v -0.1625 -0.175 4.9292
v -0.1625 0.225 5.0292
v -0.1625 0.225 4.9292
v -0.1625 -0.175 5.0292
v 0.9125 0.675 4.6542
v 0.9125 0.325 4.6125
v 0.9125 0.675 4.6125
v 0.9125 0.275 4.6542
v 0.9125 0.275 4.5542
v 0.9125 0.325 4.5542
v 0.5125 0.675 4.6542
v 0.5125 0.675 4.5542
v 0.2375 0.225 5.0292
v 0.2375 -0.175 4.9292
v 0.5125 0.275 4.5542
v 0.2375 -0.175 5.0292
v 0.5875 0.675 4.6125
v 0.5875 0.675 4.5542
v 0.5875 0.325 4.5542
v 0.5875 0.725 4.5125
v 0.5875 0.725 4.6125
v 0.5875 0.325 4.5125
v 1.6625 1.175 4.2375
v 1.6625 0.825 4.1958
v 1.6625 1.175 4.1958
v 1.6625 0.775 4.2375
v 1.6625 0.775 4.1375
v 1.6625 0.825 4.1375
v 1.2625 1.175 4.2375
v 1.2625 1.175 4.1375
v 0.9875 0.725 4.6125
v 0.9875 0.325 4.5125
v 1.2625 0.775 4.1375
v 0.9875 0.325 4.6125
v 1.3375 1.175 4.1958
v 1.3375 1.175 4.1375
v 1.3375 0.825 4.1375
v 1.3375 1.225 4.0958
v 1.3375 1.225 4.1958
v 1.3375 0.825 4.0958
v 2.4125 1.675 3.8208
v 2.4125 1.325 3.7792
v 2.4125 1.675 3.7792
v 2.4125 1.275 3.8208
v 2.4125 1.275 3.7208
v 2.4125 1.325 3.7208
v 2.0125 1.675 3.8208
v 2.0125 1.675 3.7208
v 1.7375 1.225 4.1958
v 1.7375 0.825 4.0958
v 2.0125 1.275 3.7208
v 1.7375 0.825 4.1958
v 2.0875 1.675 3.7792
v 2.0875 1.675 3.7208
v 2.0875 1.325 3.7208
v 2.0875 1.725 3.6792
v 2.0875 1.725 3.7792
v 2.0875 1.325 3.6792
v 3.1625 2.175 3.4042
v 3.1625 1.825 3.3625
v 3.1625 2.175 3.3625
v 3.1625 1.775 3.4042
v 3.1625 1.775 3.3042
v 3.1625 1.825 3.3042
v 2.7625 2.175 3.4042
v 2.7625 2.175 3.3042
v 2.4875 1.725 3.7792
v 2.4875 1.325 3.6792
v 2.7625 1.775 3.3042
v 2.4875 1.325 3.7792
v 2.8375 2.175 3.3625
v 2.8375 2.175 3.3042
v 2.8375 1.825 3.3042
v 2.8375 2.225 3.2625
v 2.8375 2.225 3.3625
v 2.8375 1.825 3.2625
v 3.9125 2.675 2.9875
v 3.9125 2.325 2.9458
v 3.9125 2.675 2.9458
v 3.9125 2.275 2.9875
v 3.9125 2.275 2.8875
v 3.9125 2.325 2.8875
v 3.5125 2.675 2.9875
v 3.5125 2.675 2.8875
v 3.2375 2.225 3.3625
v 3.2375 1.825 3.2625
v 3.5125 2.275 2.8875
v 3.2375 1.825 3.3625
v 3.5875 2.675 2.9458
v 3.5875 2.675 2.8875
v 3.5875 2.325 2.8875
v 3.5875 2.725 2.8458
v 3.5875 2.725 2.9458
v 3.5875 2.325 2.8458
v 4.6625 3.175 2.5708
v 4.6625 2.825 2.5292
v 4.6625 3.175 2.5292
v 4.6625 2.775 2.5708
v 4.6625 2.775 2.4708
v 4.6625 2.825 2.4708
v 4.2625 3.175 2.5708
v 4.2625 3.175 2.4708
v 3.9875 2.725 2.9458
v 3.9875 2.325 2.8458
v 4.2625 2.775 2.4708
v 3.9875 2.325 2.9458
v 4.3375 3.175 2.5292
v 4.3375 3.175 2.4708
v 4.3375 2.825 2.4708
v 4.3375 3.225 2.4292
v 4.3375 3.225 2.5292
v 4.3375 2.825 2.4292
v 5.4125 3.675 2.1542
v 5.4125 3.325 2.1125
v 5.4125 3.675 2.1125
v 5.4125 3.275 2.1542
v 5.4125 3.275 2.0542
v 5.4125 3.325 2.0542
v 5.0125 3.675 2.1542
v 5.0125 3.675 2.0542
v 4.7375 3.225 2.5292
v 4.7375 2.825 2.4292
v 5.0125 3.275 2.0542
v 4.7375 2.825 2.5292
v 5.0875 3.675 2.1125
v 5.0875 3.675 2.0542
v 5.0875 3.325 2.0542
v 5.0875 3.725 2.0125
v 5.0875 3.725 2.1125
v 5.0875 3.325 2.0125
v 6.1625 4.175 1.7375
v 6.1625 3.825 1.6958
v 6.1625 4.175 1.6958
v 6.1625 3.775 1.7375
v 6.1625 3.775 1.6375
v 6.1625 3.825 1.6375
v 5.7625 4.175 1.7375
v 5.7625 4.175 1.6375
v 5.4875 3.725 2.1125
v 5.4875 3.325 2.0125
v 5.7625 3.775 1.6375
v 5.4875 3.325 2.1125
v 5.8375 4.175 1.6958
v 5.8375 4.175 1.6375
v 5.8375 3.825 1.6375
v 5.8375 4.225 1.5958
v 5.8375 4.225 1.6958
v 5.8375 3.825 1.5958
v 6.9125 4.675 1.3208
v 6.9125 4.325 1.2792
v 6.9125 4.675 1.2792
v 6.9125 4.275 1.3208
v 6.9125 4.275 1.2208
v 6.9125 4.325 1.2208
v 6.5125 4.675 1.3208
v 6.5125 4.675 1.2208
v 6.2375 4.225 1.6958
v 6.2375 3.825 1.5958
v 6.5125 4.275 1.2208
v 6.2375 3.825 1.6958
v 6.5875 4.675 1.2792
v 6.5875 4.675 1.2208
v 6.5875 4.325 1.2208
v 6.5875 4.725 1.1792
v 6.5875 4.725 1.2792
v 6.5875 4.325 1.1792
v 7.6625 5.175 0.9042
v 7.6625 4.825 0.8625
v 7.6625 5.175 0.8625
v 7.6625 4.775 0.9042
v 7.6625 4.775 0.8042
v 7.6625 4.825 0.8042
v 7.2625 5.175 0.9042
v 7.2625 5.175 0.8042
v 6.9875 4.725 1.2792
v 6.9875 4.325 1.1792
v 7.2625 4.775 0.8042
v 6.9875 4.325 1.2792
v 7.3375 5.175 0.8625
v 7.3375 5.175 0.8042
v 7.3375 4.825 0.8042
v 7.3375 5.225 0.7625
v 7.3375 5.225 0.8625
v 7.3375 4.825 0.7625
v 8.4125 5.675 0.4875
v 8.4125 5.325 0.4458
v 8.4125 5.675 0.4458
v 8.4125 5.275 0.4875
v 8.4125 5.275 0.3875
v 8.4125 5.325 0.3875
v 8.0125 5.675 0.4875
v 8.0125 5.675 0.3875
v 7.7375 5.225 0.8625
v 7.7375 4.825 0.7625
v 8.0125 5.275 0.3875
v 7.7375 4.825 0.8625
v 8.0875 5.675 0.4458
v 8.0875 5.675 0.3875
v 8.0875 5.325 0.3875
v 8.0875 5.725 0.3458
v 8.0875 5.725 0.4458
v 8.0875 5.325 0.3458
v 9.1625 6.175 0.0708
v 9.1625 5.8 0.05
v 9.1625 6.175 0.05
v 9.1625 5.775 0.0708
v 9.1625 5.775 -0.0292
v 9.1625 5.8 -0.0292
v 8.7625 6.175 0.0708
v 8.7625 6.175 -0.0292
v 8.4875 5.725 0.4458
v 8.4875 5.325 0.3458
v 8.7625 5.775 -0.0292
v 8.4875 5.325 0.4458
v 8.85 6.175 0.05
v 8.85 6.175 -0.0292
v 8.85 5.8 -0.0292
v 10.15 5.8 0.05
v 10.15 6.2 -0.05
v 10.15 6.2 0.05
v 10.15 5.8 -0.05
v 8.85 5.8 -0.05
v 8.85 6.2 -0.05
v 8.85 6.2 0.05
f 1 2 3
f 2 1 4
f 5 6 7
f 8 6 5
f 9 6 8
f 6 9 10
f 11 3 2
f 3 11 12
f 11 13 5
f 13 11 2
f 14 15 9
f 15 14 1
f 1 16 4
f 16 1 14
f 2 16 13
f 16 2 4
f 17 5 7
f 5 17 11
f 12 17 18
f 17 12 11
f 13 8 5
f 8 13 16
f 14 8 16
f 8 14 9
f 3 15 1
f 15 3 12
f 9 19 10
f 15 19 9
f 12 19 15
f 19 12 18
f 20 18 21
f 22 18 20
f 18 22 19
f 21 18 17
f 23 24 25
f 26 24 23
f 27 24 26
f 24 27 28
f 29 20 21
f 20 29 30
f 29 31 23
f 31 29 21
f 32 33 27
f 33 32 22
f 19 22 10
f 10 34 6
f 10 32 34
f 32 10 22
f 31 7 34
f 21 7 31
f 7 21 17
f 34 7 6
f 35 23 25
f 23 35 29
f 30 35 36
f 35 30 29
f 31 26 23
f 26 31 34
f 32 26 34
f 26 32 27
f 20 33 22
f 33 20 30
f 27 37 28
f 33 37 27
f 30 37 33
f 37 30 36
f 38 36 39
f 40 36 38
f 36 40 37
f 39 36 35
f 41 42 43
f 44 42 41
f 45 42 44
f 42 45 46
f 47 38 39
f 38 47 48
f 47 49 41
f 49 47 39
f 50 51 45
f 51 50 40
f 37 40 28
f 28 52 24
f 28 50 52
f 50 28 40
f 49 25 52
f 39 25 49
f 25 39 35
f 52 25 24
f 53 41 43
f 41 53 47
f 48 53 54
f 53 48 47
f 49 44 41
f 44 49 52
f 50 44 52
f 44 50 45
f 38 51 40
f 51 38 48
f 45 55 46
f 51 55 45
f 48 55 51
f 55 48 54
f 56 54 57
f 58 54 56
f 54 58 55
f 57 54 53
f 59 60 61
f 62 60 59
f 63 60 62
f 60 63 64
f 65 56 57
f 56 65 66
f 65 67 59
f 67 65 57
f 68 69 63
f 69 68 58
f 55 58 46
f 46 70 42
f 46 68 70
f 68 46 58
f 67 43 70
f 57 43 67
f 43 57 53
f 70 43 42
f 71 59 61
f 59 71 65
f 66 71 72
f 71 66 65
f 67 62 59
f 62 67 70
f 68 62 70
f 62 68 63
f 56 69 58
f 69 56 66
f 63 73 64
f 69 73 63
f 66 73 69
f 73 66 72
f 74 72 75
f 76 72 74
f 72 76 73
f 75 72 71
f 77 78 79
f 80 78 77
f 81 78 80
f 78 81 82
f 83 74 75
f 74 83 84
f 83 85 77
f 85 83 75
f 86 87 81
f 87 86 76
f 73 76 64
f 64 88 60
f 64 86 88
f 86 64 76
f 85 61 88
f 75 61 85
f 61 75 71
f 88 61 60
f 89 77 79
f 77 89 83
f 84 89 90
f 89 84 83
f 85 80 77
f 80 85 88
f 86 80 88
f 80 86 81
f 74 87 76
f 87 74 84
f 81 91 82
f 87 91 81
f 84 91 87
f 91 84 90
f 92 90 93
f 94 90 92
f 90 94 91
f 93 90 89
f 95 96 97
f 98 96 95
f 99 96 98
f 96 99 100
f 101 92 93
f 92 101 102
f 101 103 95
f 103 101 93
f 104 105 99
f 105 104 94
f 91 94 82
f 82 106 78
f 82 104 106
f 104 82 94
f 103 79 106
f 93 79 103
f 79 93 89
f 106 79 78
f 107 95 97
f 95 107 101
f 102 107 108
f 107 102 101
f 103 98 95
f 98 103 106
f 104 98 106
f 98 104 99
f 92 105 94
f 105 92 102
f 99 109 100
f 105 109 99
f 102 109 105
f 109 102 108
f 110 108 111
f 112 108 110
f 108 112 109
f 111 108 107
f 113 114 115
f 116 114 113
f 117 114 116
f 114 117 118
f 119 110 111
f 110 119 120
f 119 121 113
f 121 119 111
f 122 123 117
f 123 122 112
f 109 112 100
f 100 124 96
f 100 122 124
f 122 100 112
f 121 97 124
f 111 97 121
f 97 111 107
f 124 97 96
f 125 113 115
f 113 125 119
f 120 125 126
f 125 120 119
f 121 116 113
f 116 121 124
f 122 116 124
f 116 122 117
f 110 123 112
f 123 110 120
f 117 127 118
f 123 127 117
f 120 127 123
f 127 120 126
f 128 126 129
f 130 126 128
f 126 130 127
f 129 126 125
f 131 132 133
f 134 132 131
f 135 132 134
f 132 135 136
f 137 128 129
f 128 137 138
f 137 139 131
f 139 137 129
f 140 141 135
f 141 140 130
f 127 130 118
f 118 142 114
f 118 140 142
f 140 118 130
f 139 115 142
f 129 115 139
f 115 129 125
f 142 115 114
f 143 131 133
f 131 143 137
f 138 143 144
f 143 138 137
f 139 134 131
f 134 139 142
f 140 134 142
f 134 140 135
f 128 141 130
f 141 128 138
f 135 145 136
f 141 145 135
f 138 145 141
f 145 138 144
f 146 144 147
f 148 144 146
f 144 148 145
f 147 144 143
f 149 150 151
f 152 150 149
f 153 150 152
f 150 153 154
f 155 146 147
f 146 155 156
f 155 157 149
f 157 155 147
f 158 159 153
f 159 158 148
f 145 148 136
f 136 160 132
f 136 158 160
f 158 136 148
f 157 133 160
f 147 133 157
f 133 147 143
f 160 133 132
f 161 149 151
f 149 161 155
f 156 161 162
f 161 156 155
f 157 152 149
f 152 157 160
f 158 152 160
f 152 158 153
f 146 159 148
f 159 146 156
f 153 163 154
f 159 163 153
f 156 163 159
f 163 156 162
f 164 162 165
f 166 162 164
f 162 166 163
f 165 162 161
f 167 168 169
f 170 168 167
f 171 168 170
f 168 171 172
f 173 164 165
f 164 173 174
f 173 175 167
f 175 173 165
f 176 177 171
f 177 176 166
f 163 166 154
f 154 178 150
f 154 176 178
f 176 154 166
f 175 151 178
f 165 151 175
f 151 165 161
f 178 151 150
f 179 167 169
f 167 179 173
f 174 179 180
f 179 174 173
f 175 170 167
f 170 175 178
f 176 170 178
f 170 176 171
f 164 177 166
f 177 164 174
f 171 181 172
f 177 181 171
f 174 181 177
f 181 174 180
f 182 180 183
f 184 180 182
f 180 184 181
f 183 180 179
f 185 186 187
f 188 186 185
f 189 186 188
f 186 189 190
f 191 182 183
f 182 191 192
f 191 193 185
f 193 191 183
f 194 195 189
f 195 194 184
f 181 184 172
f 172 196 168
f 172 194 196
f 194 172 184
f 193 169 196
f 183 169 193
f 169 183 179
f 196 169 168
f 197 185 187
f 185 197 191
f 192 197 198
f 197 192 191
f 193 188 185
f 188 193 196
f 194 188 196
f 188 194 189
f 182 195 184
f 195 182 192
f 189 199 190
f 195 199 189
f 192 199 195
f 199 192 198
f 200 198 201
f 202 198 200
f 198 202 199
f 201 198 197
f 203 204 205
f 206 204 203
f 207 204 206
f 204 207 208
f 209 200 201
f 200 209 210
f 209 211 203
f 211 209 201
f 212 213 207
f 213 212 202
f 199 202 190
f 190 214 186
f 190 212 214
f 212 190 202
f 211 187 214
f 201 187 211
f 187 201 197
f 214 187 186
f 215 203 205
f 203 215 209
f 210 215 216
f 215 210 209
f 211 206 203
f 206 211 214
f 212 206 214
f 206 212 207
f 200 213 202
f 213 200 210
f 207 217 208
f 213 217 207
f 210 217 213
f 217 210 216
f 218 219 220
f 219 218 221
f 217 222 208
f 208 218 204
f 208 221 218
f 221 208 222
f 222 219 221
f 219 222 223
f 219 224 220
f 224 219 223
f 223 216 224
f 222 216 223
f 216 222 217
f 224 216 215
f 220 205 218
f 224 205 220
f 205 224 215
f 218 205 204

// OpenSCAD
hull() {
    translate([0.037500000000000006, 0.025, 4.979166666666667]) cube([0.4, 0.4, 0.1], center=true);
    translate([0.7125, 0.47500000000000003, 4.604166666666667]) cube([0.4, 0.4, 0.1], center=true);
}


hull() {
    translate([0.7875000000000001, 0.525, 4.5625]) cube([0.4, 0.4, 0.1], center=true);
    translate([1.4625000000000001, 0.9750000000000001, 4.1875]) cube([0.4, 0.4, 0.1], center=true);
}


hull() {
    translate([1.5375, 1.025, 4.145833333333333]) cube([0.4, 0.4, 0.1], center=true);
    translate([2.2125, 1.475, 3.7708333333333335]) cube([0.4, 0.4, 0.1], center=true);
}


hull() {
    translate([2.2875, 1.5250000000000001, 3.729166666666667]) cube([0.4, 0.4, 0.1], center=true);
    translate([2.9625000000000004, 1.975, 3.354166666666667]) cube([0.4, 0.4, 0.1], center=true);
}


hull() {
    translate([3.0375, 2.025, 3.3125]) cube([0.4, 0.4, 0.1], center=true);
    translate([3.7125, 2.475, 2.9375000000000004]) cube([0.4, 0.4, 0.1], center=true);
}


hull() {
    translate([3.7875, 2.525, 2.895833333333334]) cube([0.4, 0.4, 0.1], center=true);
    translate([4.4624999999999995, 2.975, 2.5208333333333335]) cube([0.4, 0.4, 0.1], center=true);
}


hull() {
    translate([4.5375, 3.0250000000000004, 2.4791666666666665]) cube([0.4, 0.4, 0.1], center=true);
    translate([5.2125, 3.475, 2.1041666666666665]) cube([0.4, 0.4, 0.1], center=true);
}


hull() {
    translate([5.2875000000000005, 3.525, 2.0625]) cube([0.4, 0.4, 0.1], center=true);
    translate([5.9625, 3.975, 1.6875]) cube([0.4, 0.4, 0.1], center=true);
}


hull() {
    translate([6.0375000000000005, 4.025, 1.6458333333333333]) cube([0.4, 0.4, 0.1], center=true);
    translate([6.7125, 4.475, 1.2708333333333333]) cube([0.4, 0.4, 0.1], center=true);
}


hull() {
    translate([6.7875000000000005, 4.5249999999999995, 1.2291666666666667]) cube([0.4, 0.4, 0.1], center=true);
    translate([7.4625, 4.975, 0.8541666666666667]) cube([0.4, 0.4, 0.1], center=true);
}


hull() {
    translate([7.5375, 5.025, 0.8125]) cube([0.4, 0.4, 0.1], center=true);
    translate([8.2125, 5.4750000000000005, 0.4375]) cube([0.4, 0.4, 0.1], center=true);
}


hull() {
    translate([8.2875, 5.525, 0.3958333333333333]) cube([0.4, 0.4, 0.1], center=true);
    translate([8.9625, 5.9750000000000005, 0.020833333333333336]) cube([0.4, 0.4, 0.1], center=true);
}


hull() {
    translate([9.049999999999999, 6.0, 0.0]) cube([0.4, 0.4, 0.1], center=true);
    translate([9.95, 6.0, 0.0]) cube([0.4, 0.4, 0.1], center=true);
}
